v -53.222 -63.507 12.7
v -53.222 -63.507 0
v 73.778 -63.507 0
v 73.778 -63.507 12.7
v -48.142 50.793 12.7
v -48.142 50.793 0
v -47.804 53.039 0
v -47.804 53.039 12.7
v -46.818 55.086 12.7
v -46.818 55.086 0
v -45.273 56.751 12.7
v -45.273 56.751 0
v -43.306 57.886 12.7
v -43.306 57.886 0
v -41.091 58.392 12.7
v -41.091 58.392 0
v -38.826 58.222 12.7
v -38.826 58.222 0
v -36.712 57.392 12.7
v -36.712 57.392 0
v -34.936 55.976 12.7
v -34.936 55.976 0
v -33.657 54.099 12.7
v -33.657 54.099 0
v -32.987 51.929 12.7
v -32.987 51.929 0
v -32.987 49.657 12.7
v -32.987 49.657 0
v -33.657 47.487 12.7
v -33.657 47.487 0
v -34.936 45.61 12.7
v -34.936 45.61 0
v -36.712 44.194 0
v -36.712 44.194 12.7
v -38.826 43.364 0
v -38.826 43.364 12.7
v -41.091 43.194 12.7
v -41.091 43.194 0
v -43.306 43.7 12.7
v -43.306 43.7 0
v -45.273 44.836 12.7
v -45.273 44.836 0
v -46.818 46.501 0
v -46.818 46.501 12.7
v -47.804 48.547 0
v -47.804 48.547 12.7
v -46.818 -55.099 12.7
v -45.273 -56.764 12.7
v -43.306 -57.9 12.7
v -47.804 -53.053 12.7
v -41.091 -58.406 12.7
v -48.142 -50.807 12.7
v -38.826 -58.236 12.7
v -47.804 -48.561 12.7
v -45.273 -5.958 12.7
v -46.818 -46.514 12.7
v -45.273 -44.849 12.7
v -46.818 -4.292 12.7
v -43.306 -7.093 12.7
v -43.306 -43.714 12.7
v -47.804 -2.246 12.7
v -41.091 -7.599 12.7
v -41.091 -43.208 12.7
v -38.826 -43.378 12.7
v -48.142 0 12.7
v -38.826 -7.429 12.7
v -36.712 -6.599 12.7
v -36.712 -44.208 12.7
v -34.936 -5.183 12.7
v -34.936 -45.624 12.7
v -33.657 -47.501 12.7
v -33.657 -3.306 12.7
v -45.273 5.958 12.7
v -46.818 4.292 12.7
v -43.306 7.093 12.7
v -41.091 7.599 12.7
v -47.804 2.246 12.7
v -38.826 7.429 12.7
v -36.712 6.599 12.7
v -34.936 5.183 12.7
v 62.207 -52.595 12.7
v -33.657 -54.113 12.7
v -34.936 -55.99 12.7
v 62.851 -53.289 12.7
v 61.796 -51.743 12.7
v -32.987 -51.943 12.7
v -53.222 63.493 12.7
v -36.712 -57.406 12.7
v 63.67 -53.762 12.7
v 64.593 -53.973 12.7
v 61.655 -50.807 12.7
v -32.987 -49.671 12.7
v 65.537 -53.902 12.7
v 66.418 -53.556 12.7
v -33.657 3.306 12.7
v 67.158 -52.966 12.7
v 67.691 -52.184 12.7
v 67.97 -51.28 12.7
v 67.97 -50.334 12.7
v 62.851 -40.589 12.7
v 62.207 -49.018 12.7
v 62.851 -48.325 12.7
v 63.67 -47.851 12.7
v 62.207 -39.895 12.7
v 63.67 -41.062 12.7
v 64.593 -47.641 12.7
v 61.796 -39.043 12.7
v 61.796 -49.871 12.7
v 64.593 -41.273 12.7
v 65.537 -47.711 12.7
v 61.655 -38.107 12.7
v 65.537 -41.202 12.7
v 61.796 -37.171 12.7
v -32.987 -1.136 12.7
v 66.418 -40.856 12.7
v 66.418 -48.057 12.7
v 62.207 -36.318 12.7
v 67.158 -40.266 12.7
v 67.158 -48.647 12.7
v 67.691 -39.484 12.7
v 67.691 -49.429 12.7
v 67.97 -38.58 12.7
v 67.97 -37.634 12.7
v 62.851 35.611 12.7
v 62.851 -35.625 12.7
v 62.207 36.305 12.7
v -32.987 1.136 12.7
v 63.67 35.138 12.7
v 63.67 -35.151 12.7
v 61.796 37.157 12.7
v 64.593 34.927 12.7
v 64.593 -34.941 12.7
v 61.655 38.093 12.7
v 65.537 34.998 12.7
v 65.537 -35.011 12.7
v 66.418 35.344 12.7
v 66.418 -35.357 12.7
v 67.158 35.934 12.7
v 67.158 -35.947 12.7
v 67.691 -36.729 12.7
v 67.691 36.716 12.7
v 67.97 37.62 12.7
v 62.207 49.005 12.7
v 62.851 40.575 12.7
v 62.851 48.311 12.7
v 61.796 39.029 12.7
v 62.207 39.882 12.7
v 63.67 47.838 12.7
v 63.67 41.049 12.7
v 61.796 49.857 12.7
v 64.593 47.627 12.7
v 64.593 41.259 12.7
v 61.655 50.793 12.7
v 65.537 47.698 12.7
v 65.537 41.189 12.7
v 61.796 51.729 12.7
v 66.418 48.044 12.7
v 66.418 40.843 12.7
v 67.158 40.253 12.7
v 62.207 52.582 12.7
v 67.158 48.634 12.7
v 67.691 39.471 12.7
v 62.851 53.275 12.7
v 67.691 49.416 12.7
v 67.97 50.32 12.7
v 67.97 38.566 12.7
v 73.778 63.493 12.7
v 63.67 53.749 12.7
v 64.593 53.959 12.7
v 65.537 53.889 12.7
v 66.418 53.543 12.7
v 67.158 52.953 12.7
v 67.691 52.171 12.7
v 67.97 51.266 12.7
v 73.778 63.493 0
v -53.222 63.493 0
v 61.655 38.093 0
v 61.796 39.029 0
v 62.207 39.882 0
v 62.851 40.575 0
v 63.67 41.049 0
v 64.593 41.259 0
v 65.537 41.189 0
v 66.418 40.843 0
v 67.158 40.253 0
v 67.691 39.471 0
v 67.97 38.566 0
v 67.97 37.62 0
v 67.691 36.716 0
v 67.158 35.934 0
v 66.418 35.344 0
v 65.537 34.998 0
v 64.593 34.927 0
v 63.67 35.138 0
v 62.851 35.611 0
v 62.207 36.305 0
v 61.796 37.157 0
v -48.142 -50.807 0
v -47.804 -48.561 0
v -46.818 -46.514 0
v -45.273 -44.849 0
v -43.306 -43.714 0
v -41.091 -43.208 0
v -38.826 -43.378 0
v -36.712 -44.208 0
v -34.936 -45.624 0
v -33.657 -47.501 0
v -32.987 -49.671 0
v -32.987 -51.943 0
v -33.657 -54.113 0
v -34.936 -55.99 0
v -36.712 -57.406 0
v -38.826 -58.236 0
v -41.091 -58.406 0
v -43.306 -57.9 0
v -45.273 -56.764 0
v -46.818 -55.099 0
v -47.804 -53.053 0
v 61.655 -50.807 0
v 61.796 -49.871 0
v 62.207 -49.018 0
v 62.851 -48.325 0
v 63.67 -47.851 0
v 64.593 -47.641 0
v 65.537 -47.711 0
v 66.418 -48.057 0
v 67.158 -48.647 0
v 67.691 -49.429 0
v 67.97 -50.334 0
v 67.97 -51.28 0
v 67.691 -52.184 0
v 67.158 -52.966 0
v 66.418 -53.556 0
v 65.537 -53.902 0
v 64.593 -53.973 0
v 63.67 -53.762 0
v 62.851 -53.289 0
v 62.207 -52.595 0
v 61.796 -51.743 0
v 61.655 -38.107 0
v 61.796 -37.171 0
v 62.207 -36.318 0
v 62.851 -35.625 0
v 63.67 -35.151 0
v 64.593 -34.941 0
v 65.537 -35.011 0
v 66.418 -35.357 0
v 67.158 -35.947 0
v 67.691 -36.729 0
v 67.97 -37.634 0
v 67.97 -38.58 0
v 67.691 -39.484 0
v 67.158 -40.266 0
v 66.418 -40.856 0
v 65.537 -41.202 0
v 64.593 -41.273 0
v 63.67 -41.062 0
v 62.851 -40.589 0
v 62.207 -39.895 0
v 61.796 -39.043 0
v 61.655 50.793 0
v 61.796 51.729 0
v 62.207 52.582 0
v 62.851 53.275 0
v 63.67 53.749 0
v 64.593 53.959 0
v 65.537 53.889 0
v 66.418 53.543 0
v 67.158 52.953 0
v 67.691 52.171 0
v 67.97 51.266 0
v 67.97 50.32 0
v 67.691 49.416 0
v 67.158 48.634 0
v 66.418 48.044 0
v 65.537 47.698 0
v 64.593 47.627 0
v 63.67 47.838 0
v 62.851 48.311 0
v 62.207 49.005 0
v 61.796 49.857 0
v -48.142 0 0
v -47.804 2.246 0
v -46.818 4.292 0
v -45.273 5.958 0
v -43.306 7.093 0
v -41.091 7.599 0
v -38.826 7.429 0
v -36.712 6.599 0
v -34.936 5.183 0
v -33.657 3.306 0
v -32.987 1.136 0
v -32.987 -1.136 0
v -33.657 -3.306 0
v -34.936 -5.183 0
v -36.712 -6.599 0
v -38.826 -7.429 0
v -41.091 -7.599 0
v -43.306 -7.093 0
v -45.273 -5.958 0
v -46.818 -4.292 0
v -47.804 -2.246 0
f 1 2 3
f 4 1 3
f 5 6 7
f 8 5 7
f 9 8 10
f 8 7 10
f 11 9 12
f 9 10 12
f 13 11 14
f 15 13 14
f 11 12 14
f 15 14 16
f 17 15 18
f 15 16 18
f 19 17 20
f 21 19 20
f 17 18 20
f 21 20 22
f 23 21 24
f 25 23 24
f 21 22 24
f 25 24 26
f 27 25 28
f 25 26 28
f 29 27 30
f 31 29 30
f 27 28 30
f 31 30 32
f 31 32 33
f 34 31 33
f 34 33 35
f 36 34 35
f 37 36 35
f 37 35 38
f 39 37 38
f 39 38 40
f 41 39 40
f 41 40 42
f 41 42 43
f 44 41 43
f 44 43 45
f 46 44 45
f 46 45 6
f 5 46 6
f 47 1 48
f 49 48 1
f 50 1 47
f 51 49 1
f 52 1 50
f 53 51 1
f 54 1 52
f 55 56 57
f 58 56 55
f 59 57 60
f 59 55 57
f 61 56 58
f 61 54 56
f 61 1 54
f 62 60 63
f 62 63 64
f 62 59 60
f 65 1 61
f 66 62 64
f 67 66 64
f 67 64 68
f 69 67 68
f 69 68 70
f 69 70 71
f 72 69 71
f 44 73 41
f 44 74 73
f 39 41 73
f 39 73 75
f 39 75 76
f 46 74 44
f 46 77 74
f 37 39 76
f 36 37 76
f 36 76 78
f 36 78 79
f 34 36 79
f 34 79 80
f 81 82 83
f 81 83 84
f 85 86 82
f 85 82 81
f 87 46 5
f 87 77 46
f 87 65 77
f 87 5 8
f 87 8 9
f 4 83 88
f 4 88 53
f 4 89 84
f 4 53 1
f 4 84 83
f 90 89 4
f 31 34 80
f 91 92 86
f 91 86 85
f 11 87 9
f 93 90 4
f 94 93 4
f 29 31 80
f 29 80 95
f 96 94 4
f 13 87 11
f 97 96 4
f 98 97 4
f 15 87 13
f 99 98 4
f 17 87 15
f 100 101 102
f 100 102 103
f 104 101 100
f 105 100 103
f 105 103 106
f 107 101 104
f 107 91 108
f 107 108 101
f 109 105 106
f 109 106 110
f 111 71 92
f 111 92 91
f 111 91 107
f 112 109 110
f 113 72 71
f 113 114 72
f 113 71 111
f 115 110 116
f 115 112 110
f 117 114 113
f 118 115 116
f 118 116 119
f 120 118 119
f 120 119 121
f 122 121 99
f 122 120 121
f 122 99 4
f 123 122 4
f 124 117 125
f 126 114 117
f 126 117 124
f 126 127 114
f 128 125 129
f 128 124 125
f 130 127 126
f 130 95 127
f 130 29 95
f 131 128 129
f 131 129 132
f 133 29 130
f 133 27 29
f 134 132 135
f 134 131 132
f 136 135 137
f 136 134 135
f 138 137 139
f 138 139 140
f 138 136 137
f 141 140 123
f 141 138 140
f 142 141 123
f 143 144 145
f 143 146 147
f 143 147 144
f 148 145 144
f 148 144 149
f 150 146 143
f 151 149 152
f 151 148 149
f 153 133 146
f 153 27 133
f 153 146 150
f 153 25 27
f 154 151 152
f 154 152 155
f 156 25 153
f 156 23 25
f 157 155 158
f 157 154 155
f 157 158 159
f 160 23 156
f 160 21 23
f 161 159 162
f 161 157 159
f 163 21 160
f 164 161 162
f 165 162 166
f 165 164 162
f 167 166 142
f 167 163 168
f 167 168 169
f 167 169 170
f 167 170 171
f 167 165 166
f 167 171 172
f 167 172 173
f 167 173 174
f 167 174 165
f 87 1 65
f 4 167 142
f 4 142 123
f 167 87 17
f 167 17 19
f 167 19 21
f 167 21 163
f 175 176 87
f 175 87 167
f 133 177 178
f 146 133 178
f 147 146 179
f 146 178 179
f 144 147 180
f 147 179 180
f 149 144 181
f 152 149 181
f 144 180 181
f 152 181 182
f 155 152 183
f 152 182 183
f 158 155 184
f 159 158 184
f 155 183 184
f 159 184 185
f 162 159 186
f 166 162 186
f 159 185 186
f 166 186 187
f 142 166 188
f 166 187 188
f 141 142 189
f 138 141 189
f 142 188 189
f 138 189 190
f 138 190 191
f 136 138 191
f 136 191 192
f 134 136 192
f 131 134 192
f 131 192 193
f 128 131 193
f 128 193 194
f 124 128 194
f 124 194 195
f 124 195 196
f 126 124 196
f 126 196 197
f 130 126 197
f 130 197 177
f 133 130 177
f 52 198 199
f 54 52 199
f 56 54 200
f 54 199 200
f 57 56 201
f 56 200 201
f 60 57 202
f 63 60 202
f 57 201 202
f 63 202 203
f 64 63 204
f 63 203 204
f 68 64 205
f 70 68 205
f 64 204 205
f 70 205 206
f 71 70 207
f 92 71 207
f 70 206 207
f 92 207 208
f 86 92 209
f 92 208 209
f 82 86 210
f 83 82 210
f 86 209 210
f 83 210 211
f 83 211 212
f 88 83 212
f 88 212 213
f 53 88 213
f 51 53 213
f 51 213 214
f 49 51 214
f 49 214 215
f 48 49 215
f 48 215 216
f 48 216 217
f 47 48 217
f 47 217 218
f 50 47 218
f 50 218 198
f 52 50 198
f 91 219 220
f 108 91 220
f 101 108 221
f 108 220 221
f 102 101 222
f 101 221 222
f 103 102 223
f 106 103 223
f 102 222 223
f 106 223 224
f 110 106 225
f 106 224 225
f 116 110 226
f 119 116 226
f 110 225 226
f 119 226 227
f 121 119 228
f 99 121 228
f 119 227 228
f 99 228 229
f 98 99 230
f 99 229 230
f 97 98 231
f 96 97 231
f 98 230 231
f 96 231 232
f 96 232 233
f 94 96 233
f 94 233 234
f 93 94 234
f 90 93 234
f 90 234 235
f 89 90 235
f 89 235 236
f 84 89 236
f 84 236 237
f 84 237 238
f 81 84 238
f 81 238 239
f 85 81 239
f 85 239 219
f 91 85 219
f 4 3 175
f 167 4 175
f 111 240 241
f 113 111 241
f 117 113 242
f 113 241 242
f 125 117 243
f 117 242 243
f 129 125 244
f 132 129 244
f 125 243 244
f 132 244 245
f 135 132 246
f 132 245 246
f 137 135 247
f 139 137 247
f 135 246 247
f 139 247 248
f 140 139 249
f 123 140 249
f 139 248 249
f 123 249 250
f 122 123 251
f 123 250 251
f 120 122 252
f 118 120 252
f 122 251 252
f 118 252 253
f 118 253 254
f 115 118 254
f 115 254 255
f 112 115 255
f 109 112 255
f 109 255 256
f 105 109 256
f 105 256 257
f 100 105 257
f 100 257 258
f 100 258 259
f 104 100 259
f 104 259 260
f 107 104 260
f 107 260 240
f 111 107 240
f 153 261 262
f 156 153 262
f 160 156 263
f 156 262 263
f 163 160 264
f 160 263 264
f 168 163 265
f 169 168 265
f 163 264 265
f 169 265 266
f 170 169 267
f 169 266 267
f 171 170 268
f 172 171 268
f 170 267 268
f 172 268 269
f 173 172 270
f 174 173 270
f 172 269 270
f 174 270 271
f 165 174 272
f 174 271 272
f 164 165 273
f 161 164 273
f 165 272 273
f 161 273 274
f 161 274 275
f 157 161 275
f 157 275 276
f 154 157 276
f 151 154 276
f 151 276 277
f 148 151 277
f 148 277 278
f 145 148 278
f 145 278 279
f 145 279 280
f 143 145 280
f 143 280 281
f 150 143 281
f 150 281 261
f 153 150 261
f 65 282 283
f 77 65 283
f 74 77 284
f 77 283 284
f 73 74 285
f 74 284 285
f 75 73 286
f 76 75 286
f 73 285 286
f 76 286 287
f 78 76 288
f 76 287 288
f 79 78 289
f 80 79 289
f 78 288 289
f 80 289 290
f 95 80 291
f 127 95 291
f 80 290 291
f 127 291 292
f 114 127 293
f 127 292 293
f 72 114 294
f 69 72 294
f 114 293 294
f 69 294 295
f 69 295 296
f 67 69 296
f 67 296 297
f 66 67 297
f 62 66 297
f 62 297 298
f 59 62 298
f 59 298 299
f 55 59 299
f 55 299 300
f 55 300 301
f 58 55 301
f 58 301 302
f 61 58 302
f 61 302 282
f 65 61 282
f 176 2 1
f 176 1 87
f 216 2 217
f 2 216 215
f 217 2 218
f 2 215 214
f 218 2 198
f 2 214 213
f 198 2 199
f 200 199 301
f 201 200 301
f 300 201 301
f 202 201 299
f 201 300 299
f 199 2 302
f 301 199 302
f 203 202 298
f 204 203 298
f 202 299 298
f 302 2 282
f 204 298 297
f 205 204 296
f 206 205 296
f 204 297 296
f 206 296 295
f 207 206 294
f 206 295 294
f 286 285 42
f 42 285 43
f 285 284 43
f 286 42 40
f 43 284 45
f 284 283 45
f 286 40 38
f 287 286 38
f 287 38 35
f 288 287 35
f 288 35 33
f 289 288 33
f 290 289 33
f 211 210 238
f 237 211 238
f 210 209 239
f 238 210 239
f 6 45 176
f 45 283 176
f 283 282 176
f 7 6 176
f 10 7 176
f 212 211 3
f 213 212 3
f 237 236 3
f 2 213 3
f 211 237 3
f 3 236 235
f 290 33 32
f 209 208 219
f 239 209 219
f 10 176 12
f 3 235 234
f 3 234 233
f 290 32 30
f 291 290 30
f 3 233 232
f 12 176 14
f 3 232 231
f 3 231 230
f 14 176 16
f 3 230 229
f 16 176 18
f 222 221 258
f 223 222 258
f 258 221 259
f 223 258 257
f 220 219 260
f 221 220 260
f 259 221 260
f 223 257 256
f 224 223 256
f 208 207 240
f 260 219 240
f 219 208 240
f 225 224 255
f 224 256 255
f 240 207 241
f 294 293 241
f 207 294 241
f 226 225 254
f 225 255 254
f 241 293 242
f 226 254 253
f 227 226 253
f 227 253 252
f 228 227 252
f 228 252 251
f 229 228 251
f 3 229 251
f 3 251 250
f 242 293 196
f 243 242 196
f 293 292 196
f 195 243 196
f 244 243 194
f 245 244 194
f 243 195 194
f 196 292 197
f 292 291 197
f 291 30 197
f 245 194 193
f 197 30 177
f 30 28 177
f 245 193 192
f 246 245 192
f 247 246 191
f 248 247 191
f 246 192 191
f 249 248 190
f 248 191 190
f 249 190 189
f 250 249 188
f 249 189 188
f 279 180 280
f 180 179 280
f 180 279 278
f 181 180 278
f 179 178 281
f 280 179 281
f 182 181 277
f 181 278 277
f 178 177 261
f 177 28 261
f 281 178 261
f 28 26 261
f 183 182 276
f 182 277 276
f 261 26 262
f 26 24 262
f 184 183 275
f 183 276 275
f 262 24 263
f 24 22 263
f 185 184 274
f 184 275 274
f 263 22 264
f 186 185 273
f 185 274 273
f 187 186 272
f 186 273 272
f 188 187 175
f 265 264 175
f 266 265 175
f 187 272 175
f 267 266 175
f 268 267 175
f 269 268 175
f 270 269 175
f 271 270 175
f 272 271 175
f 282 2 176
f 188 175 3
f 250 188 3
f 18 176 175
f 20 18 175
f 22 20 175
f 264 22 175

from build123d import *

# Parameters (mm, degrees)
F0_W     = 127
F0_H     = 127
F1_DEPTH = 12.7
F3_D     = 15.24
F3_DEPTH = 12.7
F5_D     = 6.35
F5_DEPTH = 12.7


with BuildPart() as f1:
    # F0 (on Top) → F1 (new body)
    with BuildSketch(Plane.XY):
        with Locations((10.277962, -0.006821)):
            Rectangle(F0_W, F0_H)
    extrude(amount=F1_DEPTH)

    # F3
    with Locations(Plane.XY.offset(12.7)):
        with Locations((-40.522038, 50.793179), (-40.522038, 0), (-40.522038, -50.806821)):
            Hole(F3_D / 2, depth=F3_DEPTH)

    # F5
    with Locations(Plane.XY.offset(12.7)):
        with Locations((64.830244, -38.106821), (64.830244, 50.793179), (64.830244, 38.093179), (64.830244, -50.806821)):
            Hole(F5_D / 2, depth=F5_DEPTH)


solid = f1.part
